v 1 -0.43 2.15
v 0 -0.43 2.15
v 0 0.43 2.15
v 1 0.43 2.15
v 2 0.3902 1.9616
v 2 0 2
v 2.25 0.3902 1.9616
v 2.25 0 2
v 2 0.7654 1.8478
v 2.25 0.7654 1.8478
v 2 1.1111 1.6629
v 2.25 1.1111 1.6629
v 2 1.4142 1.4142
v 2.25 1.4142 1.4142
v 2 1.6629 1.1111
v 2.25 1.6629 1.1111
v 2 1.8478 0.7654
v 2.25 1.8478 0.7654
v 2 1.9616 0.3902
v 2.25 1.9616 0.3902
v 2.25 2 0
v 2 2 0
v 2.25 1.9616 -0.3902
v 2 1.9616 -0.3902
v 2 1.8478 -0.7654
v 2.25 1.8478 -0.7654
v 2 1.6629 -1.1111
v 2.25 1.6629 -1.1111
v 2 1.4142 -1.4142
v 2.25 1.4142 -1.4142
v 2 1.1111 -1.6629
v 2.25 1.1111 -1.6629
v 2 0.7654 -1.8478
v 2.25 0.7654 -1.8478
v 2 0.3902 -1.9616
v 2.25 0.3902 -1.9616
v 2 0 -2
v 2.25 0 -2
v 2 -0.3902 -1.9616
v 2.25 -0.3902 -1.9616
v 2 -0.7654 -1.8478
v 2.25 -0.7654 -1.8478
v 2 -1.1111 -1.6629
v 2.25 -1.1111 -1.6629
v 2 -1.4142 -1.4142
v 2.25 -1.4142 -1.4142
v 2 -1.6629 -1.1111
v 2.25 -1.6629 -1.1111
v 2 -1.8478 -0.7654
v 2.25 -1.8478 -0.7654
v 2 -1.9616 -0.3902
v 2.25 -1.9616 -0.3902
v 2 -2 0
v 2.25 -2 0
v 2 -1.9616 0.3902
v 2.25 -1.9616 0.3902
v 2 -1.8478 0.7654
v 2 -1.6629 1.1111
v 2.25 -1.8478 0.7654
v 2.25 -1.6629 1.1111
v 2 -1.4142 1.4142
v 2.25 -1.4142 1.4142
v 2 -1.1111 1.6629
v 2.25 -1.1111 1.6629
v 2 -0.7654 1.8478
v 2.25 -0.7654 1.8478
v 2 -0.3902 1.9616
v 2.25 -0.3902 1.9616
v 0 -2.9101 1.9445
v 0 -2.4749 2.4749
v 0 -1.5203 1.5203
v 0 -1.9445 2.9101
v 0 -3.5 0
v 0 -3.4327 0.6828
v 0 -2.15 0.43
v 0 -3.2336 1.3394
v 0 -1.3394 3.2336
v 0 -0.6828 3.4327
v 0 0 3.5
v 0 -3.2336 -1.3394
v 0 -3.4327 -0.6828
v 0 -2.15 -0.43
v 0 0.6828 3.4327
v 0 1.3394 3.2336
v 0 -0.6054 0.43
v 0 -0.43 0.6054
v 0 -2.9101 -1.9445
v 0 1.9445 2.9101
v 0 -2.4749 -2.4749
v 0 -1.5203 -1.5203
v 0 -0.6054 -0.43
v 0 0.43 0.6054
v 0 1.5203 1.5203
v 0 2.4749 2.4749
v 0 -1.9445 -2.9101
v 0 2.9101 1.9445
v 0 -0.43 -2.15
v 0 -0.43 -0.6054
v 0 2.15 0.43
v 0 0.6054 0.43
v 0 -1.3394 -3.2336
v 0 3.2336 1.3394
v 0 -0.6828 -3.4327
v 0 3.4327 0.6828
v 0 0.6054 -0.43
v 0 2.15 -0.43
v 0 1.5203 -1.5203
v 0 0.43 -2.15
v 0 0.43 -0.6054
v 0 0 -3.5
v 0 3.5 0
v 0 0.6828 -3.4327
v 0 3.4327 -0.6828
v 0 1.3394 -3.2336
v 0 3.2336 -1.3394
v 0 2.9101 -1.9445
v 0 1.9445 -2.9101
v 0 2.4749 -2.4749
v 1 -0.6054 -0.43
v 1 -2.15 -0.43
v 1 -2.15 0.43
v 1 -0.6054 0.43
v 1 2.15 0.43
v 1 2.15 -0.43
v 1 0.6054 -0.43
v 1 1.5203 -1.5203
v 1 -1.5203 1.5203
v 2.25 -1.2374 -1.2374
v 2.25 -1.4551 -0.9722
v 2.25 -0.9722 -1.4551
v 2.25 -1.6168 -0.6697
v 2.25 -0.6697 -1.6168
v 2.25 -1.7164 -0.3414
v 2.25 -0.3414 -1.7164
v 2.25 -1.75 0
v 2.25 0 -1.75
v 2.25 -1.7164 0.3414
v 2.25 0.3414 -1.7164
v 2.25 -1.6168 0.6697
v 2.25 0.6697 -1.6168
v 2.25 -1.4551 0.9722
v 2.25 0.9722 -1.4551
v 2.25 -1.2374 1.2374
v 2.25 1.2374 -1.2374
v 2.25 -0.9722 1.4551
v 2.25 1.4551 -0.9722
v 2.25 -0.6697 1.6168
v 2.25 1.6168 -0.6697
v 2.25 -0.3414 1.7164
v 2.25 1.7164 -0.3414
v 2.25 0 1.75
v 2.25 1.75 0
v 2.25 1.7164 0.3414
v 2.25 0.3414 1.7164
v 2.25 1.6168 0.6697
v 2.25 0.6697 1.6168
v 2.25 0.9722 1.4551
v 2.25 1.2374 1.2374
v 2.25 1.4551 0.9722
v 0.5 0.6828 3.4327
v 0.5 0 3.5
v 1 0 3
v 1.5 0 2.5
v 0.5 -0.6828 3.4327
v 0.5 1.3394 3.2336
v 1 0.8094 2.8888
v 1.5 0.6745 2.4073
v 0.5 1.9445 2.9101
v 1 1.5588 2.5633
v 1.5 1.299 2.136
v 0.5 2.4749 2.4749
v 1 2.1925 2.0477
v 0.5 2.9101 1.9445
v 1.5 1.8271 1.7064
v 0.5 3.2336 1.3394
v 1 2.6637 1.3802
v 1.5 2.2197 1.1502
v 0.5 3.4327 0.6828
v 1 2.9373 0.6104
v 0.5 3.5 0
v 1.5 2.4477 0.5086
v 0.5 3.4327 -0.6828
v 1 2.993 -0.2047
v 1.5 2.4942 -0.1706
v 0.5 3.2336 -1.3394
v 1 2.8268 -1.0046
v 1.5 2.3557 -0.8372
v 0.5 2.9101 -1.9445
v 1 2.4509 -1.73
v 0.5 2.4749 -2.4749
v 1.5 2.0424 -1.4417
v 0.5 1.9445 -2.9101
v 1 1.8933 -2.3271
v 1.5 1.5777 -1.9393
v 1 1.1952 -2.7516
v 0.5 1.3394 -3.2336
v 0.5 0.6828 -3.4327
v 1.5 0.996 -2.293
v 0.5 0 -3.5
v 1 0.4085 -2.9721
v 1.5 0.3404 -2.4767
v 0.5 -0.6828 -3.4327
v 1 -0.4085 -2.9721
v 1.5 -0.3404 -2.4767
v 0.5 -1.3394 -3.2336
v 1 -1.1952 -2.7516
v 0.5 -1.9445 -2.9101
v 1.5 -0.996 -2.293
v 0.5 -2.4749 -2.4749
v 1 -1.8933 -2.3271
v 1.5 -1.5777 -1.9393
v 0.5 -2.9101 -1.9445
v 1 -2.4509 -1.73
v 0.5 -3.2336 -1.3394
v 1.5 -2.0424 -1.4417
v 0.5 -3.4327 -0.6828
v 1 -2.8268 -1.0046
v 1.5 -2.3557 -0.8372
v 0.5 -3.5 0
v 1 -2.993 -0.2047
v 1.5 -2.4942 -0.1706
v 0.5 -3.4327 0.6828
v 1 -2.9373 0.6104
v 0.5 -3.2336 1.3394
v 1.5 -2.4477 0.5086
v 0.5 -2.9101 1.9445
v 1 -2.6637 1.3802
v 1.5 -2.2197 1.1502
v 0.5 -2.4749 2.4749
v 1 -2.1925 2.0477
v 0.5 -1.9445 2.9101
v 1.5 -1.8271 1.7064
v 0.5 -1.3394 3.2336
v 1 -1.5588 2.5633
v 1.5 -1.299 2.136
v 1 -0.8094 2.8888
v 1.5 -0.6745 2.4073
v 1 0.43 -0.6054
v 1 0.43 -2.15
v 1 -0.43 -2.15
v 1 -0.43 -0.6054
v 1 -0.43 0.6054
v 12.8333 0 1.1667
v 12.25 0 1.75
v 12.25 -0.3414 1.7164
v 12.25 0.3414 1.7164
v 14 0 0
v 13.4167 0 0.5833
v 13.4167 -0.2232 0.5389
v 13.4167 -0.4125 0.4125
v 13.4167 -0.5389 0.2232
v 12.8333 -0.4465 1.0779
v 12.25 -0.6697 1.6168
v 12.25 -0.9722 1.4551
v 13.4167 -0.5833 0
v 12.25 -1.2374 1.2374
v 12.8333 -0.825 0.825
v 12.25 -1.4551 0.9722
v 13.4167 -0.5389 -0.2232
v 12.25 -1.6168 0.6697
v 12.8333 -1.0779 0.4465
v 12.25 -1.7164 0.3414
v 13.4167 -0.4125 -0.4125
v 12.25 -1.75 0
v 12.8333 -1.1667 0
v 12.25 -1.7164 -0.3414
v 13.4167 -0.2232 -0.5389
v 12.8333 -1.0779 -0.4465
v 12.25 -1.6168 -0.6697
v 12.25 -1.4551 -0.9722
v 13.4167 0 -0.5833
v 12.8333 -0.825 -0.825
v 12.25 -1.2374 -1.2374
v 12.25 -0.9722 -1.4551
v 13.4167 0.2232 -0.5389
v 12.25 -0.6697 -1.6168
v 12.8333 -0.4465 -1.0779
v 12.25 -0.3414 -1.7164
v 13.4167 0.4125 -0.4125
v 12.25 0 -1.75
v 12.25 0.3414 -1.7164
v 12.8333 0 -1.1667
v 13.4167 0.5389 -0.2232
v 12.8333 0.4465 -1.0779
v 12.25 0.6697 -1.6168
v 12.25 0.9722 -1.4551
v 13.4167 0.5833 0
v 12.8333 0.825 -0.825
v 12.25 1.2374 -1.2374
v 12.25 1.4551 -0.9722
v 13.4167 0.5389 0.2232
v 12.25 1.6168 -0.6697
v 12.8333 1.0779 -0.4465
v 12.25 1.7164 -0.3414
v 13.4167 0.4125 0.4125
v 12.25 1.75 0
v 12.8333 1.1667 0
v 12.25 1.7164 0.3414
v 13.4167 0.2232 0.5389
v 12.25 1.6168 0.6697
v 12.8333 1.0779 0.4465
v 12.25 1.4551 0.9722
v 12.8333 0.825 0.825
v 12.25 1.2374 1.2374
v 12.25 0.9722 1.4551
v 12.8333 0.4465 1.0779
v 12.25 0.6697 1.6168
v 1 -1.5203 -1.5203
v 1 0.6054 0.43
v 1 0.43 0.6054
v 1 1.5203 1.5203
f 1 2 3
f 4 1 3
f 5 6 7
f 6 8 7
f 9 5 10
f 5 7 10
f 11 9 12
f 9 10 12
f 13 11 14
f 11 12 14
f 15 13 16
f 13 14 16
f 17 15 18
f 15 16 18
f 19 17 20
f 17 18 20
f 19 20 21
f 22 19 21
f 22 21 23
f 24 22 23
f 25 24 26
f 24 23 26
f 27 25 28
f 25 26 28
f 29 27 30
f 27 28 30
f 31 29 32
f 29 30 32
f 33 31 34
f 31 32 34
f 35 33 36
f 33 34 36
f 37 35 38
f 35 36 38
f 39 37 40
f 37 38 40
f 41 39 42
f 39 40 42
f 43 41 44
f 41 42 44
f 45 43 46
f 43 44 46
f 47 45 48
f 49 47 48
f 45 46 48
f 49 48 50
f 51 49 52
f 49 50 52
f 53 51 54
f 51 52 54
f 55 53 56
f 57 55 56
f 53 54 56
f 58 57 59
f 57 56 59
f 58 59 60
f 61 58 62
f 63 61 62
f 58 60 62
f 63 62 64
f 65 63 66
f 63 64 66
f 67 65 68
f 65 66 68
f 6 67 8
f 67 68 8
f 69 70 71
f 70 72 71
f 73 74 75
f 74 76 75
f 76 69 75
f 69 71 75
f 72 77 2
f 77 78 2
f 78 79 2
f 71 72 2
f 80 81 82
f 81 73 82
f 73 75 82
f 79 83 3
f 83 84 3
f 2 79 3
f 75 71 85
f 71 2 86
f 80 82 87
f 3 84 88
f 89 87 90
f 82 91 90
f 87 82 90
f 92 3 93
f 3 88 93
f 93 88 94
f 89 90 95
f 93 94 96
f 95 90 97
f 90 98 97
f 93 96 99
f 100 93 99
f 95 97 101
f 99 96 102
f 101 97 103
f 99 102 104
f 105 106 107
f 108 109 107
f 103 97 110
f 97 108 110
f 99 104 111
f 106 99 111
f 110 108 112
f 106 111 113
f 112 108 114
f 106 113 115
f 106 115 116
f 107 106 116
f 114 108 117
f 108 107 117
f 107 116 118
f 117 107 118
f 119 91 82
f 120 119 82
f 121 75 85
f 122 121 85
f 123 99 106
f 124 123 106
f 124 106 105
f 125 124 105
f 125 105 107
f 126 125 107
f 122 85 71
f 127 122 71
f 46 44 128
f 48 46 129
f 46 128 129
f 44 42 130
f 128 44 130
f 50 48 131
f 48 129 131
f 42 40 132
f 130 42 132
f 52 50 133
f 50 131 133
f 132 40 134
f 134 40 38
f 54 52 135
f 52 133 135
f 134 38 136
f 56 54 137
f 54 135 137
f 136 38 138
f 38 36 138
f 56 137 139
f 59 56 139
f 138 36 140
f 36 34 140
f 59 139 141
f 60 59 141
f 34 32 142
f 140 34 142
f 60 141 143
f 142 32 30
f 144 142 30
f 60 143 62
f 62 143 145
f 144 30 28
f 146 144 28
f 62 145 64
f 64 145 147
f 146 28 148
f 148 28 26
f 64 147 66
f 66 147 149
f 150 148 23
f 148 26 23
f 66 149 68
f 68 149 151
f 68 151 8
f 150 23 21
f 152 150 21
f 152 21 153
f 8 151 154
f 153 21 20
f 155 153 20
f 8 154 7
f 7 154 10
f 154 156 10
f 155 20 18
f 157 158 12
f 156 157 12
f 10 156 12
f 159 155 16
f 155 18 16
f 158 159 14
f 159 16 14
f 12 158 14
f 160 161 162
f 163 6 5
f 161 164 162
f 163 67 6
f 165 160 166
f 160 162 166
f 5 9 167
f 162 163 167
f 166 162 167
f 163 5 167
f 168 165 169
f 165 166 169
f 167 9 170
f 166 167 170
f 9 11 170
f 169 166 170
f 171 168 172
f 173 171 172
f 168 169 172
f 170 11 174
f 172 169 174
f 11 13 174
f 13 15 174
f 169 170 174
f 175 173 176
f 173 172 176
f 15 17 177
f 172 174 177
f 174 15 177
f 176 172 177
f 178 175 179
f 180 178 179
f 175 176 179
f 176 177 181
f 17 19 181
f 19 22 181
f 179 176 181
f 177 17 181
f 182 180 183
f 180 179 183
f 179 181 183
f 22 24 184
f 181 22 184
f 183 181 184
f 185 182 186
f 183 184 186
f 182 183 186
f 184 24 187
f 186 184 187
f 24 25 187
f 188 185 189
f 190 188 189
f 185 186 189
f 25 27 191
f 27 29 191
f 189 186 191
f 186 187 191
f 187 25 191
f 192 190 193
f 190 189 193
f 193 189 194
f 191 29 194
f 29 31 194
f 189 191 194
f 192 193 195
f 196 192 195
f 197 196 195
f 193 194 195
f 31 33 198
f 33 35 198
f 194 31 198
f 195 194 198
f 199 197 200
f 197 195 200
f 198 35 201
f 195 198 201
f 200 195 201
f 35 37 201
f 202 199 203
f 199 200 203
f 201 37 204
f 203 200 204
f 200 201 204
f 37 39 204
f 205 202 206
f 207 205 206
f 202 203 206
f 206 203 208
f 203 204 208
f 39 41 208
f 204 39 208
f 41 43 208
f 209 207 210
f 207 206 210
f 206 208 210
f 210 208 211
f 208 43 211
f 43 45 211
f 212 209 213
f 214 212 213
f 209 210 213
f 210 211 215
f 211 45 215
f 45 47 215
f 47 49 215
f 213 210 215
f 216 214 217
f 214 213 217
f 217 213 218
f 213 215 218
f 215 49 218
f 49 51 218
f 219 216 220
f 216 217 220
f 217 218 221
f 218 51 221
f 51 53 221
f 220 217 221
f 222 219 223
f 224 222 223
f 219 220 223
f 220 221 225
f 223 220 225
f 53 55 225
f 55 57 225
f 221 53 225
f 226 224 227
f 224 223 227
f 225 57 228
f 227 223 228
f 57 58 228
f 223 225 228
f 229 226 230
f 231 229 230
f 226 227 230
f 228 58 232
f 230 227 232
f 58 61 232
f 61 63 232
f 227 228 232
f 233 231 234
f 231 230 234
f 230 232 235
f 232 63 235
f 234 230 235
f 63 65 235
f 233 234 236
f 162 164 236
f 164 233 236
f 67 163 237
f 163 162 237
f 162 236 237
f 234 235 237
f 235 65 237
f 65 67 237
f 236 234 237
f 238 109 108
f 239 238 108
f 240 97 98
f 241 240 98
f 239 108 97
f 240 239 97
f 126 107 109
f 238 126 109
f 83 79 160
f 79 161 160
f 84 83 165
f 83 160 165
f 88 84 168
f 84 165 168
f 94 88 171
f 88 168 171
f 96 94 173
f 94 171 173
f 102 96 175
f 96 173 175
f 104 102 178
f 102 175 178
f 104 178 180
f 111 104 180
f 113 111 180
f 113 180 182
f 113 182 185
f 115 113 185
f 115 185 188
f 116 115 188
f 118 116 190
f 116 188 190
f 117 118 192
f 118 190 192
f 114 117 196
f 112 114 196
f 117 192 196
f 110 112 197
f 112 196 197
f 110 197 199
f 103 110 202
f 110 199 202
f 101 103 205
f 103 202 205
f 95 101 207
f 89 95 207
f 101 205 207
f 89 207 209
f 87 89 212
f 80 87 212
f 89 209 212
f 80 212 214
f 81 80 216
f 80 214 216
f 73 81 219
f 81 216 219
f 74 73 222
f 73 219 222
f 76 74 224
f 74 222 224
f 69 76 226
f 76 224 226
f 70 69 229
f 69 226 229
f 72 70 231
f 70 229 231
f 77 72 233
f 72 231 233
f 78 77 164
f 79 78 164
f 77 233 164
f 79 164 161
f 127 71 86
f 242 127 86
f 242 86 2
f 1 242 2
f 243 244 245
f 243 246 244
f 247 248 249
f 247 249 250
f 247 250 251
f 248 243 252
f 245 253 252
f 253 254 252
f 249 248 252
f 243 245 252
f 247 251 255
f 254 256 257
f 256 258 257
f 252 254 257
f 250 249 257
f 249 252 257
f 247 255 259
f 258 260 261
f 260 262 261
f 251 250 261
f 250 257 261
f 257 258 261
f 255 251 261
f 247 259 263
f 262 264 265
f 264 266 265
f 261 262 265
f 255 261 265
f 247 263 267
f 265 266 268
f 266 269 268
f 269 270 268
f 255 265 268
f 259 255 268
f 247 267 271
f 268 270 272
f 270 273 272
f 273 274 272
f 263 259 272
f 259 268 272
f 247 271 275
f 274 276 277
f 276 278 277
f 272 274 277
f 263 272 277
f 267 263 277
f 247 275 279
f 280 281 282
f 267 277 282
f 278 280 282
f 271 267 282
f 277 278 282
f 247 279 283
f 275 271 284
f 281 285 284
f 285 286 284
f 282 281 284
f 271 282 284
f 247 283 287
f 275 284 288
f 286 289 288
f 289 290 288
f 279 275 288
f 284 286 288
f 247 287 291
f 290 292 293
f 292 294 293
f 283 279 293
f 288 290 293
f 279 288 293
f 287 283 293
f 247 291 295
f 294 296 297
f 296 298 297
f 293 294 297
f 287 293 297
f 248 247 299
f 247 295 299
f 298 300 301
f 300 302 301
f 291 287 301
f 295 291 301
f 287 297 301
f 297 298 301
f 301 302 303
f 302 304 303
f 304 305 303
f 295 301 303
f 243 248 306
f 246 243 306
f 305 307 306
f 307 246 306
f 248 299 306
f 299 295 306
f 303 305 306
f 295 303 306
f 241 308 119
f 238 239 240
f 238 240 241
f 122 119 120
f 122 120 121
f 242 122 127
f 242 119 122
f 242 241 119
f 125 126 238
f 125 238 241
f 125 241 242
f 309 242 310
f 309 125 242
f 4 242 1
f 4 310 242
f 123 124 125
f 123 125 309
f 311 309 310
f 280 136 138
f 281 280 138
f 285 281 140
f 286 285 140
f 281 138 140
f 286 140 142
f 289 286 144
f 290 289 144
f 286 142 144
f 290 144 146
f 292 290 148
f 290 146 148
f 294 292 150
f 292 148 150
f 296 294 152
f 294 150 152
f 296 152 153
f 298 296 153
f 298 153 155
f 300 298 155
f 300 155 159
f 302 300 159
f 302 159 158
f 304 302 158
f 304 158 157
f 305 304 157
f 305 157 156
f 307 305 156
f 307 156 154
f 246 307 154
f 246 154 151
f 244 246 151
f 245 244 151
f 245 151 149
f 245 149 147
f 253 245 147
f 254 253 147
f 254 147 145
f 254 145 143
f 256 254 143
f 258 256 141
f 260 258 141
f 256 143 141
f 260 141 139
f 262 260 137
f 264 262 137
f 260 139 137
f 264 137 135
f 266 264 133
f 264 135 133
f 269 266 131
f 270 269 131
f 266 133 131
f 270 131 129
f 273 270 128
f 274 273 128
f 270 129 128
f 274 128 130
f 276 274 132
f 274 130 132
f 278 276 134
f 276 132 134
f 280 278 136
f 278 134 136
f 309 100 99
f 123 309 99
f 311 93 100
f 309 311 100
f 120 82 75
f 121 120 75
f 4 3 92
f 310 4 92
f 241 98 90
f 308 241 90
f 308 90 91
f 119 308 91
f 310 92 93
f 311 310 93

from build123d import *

# Parameters (mm, degrees)
SKETCH2_R           = 1.75
BOSS_EXTRUDE1_DEPTH = 10
CUT_EXTRUDE1_DEPTH  = 1
DRAFT1_ANGLE        = -40
DRAFT2_ANGLE        = -40
DRAFT3_ANGLE        = -40
DRAFT4_ANGLE        = -40
DRAFT5_ANGLE        = -40
DRAFT6_ANGLE        = -40
DRAFT7_ANGLE        = -40
DRAFT8_ANGLE        = -40


with BuildPart() as part:
    # Sketch1 → Revolve1 (revolve)
    with BuildSketch(Plane(origin=(0, 0, 0), x_dir=(-1, 0, 0), z_dir=(0, 0, -1)), mode=Mode.PRIVATE) as revolve1_sk:
        Polygon((-2.25, 2), (-2.25, 0), (0, 0), (0, 3.5), (-0.5, 3.5), (-2, 2), align=None)
    revolve(revolve1_sk.sketch.rotate(Axis((2.25, 0, 0), (-1, 0, 0)), 270), axis=Axis((2.25, 0, 0), (-1, 0, 0)))

    # Sketch2 → Boss-Extrude1 (add)
    with BuildSketch(Plane(origin=(2.25, 0, 0), x_dir=(0, 0, -1), z_dir=(1, 0, 0))):
        Circle(SKETCH2_R)
    extrude(amount=BOSS_EXTRUDE1_DEPTH)

    # Sketch3 → Revolve2 (revolve)
    with BuildSketch(Plane.XY, mode=Mode.PRIVATE) as revolve2_sk:
        Polygon((12.25, 1.75), (12.25, 0), (14, 0), align=None)
    revolve(revolve2_sk.sketch.rotate(Axis((14.949975, 0, 0), (1, 0, 0)), 90), axis=Axis((14.949975, 0, 0), (1, 0, 0)))

    # Sketch4 → Cut-Extrude1 (cut)
    with BuildSketch(Plane.ZY):
        Polygon((-0.605426386, -0.43), (-0.605426386, -0.605426386), (-0.43, -0.605426386), (-0.43, -2.15), (0.43, -2.15), (0.43, -0.605426386), (0.605426386, -0.605426386), (0.605426386, -0.43), (2.15, -0.43), (2.15, 0.43), (0.605426386, 0.43), (0.605426386, 0.605426386), (0.43, 0.605426386), (0.43, 2.15), (-0.43, 2.15), (-0.43, 0.605426386), (-0.605426386, 0.605426386), (-0.605426386, 0.43), (-2.15, 0.43), (-2.15, -0.43), align=None)
    extrude(amount=-CUT_EXTRUDE1_DEPTH, mode=Mode.SUBTRACT)

    # Draft1
    draft1_faces = [part.faces().sort_by_distance(p)[0] for p in [
        (0.5, -0.605426386, -0.517713193),
    ]]
    draft(draft1_faces, Plane(origin=(1, -0.605426386, -0.43), x_dir=(0, 1, 0), z_dir=(0, 0, 1)), DRAFT1_ANGLE)

    # Draft2
    draft2_faces = [part.faces().sort_by_distance(p)[0] for p in [
        (0.5, -0.605426386, 0.517713193),
    ]]
    draft(draft2_faces, Plane(origin=(1, -2.15, 0.43), x_dir=(0, -1, 0), z_dir=(0, 0, -1)), DRAFT2_ANGLE)

    # Draft3
    draft3_faces = [part.faces().sort_by_distance(p)[0] for p in [
        (0.5, -0.591313301, 0.605426386),
    ]]
    draft(draft3_faces, Plane(origin=(1, -0.43, 0.605426386), x_dir=(0, 0, 1), z_dir=(0, 1, 0)), DRAFT3_ANGLE)

    # Draft4
    draft4_faces = [part.faces().sort_by_distance(p)[0] for p in [
        (0.5, 0.517713193, 0.605426386),
    ]]
    draft(draft4_faces, Plane(origin=(1, 0.43, 2.15), x_dir=(0, 0, -1), z_dir=(0, -1, 0)), DRAFT4_ANGLE)

    # Draft5
    draft5_faces = [part.faces().sort_by_distance(p)[0] for p in [
        (0.5, 0.605426386, 0.591313301),
    ]]
    draft(draft5_faces, Plane(origin=(1, 0.605426386, 0.43), x_dir=(0, -1, 0), z_dir=(0, 0, -1)), DRAFT5_ANGLE)

    # Draft6
    draft6_faces = [part.faces().sort_by_distance(p)[0] for p in [
        (0.5, 0.605426386, -0.517713193),
    ]]
    draft(draft6_faces, Plane(origin=(1, 2.15, -0.43), x_dir=(0, 1, 0), z_dir=(0, 0, 1)), DRAFT6_ANGLE)

    # Draft7
    draft7_faces = [part.faces().sort_by_distance(p)[0] for p in [
        (0.5, 0.591313301, -0.605426386),
    ]]
    draft(draft7_faces, Plane(origin=(1, 0.43, -0.605426386), x_dir=(0, 0, -1), z_dir=(0, -1, 0)), DRAFT7_ANGLE)

    # Draft8
    draft8_faces = [part.faces().sort_by_distance(p)[0] for p in [
        (0.5, -0.591313301, -0.605426386),
    ]]
    draft(draft8_faces, Plane(origin=(1, -0.43, -2.15), x_dir=(0, 0, 1), z_dir=(0, 1, 0)), DRAFT8_ANGLE)


solid = part.part
